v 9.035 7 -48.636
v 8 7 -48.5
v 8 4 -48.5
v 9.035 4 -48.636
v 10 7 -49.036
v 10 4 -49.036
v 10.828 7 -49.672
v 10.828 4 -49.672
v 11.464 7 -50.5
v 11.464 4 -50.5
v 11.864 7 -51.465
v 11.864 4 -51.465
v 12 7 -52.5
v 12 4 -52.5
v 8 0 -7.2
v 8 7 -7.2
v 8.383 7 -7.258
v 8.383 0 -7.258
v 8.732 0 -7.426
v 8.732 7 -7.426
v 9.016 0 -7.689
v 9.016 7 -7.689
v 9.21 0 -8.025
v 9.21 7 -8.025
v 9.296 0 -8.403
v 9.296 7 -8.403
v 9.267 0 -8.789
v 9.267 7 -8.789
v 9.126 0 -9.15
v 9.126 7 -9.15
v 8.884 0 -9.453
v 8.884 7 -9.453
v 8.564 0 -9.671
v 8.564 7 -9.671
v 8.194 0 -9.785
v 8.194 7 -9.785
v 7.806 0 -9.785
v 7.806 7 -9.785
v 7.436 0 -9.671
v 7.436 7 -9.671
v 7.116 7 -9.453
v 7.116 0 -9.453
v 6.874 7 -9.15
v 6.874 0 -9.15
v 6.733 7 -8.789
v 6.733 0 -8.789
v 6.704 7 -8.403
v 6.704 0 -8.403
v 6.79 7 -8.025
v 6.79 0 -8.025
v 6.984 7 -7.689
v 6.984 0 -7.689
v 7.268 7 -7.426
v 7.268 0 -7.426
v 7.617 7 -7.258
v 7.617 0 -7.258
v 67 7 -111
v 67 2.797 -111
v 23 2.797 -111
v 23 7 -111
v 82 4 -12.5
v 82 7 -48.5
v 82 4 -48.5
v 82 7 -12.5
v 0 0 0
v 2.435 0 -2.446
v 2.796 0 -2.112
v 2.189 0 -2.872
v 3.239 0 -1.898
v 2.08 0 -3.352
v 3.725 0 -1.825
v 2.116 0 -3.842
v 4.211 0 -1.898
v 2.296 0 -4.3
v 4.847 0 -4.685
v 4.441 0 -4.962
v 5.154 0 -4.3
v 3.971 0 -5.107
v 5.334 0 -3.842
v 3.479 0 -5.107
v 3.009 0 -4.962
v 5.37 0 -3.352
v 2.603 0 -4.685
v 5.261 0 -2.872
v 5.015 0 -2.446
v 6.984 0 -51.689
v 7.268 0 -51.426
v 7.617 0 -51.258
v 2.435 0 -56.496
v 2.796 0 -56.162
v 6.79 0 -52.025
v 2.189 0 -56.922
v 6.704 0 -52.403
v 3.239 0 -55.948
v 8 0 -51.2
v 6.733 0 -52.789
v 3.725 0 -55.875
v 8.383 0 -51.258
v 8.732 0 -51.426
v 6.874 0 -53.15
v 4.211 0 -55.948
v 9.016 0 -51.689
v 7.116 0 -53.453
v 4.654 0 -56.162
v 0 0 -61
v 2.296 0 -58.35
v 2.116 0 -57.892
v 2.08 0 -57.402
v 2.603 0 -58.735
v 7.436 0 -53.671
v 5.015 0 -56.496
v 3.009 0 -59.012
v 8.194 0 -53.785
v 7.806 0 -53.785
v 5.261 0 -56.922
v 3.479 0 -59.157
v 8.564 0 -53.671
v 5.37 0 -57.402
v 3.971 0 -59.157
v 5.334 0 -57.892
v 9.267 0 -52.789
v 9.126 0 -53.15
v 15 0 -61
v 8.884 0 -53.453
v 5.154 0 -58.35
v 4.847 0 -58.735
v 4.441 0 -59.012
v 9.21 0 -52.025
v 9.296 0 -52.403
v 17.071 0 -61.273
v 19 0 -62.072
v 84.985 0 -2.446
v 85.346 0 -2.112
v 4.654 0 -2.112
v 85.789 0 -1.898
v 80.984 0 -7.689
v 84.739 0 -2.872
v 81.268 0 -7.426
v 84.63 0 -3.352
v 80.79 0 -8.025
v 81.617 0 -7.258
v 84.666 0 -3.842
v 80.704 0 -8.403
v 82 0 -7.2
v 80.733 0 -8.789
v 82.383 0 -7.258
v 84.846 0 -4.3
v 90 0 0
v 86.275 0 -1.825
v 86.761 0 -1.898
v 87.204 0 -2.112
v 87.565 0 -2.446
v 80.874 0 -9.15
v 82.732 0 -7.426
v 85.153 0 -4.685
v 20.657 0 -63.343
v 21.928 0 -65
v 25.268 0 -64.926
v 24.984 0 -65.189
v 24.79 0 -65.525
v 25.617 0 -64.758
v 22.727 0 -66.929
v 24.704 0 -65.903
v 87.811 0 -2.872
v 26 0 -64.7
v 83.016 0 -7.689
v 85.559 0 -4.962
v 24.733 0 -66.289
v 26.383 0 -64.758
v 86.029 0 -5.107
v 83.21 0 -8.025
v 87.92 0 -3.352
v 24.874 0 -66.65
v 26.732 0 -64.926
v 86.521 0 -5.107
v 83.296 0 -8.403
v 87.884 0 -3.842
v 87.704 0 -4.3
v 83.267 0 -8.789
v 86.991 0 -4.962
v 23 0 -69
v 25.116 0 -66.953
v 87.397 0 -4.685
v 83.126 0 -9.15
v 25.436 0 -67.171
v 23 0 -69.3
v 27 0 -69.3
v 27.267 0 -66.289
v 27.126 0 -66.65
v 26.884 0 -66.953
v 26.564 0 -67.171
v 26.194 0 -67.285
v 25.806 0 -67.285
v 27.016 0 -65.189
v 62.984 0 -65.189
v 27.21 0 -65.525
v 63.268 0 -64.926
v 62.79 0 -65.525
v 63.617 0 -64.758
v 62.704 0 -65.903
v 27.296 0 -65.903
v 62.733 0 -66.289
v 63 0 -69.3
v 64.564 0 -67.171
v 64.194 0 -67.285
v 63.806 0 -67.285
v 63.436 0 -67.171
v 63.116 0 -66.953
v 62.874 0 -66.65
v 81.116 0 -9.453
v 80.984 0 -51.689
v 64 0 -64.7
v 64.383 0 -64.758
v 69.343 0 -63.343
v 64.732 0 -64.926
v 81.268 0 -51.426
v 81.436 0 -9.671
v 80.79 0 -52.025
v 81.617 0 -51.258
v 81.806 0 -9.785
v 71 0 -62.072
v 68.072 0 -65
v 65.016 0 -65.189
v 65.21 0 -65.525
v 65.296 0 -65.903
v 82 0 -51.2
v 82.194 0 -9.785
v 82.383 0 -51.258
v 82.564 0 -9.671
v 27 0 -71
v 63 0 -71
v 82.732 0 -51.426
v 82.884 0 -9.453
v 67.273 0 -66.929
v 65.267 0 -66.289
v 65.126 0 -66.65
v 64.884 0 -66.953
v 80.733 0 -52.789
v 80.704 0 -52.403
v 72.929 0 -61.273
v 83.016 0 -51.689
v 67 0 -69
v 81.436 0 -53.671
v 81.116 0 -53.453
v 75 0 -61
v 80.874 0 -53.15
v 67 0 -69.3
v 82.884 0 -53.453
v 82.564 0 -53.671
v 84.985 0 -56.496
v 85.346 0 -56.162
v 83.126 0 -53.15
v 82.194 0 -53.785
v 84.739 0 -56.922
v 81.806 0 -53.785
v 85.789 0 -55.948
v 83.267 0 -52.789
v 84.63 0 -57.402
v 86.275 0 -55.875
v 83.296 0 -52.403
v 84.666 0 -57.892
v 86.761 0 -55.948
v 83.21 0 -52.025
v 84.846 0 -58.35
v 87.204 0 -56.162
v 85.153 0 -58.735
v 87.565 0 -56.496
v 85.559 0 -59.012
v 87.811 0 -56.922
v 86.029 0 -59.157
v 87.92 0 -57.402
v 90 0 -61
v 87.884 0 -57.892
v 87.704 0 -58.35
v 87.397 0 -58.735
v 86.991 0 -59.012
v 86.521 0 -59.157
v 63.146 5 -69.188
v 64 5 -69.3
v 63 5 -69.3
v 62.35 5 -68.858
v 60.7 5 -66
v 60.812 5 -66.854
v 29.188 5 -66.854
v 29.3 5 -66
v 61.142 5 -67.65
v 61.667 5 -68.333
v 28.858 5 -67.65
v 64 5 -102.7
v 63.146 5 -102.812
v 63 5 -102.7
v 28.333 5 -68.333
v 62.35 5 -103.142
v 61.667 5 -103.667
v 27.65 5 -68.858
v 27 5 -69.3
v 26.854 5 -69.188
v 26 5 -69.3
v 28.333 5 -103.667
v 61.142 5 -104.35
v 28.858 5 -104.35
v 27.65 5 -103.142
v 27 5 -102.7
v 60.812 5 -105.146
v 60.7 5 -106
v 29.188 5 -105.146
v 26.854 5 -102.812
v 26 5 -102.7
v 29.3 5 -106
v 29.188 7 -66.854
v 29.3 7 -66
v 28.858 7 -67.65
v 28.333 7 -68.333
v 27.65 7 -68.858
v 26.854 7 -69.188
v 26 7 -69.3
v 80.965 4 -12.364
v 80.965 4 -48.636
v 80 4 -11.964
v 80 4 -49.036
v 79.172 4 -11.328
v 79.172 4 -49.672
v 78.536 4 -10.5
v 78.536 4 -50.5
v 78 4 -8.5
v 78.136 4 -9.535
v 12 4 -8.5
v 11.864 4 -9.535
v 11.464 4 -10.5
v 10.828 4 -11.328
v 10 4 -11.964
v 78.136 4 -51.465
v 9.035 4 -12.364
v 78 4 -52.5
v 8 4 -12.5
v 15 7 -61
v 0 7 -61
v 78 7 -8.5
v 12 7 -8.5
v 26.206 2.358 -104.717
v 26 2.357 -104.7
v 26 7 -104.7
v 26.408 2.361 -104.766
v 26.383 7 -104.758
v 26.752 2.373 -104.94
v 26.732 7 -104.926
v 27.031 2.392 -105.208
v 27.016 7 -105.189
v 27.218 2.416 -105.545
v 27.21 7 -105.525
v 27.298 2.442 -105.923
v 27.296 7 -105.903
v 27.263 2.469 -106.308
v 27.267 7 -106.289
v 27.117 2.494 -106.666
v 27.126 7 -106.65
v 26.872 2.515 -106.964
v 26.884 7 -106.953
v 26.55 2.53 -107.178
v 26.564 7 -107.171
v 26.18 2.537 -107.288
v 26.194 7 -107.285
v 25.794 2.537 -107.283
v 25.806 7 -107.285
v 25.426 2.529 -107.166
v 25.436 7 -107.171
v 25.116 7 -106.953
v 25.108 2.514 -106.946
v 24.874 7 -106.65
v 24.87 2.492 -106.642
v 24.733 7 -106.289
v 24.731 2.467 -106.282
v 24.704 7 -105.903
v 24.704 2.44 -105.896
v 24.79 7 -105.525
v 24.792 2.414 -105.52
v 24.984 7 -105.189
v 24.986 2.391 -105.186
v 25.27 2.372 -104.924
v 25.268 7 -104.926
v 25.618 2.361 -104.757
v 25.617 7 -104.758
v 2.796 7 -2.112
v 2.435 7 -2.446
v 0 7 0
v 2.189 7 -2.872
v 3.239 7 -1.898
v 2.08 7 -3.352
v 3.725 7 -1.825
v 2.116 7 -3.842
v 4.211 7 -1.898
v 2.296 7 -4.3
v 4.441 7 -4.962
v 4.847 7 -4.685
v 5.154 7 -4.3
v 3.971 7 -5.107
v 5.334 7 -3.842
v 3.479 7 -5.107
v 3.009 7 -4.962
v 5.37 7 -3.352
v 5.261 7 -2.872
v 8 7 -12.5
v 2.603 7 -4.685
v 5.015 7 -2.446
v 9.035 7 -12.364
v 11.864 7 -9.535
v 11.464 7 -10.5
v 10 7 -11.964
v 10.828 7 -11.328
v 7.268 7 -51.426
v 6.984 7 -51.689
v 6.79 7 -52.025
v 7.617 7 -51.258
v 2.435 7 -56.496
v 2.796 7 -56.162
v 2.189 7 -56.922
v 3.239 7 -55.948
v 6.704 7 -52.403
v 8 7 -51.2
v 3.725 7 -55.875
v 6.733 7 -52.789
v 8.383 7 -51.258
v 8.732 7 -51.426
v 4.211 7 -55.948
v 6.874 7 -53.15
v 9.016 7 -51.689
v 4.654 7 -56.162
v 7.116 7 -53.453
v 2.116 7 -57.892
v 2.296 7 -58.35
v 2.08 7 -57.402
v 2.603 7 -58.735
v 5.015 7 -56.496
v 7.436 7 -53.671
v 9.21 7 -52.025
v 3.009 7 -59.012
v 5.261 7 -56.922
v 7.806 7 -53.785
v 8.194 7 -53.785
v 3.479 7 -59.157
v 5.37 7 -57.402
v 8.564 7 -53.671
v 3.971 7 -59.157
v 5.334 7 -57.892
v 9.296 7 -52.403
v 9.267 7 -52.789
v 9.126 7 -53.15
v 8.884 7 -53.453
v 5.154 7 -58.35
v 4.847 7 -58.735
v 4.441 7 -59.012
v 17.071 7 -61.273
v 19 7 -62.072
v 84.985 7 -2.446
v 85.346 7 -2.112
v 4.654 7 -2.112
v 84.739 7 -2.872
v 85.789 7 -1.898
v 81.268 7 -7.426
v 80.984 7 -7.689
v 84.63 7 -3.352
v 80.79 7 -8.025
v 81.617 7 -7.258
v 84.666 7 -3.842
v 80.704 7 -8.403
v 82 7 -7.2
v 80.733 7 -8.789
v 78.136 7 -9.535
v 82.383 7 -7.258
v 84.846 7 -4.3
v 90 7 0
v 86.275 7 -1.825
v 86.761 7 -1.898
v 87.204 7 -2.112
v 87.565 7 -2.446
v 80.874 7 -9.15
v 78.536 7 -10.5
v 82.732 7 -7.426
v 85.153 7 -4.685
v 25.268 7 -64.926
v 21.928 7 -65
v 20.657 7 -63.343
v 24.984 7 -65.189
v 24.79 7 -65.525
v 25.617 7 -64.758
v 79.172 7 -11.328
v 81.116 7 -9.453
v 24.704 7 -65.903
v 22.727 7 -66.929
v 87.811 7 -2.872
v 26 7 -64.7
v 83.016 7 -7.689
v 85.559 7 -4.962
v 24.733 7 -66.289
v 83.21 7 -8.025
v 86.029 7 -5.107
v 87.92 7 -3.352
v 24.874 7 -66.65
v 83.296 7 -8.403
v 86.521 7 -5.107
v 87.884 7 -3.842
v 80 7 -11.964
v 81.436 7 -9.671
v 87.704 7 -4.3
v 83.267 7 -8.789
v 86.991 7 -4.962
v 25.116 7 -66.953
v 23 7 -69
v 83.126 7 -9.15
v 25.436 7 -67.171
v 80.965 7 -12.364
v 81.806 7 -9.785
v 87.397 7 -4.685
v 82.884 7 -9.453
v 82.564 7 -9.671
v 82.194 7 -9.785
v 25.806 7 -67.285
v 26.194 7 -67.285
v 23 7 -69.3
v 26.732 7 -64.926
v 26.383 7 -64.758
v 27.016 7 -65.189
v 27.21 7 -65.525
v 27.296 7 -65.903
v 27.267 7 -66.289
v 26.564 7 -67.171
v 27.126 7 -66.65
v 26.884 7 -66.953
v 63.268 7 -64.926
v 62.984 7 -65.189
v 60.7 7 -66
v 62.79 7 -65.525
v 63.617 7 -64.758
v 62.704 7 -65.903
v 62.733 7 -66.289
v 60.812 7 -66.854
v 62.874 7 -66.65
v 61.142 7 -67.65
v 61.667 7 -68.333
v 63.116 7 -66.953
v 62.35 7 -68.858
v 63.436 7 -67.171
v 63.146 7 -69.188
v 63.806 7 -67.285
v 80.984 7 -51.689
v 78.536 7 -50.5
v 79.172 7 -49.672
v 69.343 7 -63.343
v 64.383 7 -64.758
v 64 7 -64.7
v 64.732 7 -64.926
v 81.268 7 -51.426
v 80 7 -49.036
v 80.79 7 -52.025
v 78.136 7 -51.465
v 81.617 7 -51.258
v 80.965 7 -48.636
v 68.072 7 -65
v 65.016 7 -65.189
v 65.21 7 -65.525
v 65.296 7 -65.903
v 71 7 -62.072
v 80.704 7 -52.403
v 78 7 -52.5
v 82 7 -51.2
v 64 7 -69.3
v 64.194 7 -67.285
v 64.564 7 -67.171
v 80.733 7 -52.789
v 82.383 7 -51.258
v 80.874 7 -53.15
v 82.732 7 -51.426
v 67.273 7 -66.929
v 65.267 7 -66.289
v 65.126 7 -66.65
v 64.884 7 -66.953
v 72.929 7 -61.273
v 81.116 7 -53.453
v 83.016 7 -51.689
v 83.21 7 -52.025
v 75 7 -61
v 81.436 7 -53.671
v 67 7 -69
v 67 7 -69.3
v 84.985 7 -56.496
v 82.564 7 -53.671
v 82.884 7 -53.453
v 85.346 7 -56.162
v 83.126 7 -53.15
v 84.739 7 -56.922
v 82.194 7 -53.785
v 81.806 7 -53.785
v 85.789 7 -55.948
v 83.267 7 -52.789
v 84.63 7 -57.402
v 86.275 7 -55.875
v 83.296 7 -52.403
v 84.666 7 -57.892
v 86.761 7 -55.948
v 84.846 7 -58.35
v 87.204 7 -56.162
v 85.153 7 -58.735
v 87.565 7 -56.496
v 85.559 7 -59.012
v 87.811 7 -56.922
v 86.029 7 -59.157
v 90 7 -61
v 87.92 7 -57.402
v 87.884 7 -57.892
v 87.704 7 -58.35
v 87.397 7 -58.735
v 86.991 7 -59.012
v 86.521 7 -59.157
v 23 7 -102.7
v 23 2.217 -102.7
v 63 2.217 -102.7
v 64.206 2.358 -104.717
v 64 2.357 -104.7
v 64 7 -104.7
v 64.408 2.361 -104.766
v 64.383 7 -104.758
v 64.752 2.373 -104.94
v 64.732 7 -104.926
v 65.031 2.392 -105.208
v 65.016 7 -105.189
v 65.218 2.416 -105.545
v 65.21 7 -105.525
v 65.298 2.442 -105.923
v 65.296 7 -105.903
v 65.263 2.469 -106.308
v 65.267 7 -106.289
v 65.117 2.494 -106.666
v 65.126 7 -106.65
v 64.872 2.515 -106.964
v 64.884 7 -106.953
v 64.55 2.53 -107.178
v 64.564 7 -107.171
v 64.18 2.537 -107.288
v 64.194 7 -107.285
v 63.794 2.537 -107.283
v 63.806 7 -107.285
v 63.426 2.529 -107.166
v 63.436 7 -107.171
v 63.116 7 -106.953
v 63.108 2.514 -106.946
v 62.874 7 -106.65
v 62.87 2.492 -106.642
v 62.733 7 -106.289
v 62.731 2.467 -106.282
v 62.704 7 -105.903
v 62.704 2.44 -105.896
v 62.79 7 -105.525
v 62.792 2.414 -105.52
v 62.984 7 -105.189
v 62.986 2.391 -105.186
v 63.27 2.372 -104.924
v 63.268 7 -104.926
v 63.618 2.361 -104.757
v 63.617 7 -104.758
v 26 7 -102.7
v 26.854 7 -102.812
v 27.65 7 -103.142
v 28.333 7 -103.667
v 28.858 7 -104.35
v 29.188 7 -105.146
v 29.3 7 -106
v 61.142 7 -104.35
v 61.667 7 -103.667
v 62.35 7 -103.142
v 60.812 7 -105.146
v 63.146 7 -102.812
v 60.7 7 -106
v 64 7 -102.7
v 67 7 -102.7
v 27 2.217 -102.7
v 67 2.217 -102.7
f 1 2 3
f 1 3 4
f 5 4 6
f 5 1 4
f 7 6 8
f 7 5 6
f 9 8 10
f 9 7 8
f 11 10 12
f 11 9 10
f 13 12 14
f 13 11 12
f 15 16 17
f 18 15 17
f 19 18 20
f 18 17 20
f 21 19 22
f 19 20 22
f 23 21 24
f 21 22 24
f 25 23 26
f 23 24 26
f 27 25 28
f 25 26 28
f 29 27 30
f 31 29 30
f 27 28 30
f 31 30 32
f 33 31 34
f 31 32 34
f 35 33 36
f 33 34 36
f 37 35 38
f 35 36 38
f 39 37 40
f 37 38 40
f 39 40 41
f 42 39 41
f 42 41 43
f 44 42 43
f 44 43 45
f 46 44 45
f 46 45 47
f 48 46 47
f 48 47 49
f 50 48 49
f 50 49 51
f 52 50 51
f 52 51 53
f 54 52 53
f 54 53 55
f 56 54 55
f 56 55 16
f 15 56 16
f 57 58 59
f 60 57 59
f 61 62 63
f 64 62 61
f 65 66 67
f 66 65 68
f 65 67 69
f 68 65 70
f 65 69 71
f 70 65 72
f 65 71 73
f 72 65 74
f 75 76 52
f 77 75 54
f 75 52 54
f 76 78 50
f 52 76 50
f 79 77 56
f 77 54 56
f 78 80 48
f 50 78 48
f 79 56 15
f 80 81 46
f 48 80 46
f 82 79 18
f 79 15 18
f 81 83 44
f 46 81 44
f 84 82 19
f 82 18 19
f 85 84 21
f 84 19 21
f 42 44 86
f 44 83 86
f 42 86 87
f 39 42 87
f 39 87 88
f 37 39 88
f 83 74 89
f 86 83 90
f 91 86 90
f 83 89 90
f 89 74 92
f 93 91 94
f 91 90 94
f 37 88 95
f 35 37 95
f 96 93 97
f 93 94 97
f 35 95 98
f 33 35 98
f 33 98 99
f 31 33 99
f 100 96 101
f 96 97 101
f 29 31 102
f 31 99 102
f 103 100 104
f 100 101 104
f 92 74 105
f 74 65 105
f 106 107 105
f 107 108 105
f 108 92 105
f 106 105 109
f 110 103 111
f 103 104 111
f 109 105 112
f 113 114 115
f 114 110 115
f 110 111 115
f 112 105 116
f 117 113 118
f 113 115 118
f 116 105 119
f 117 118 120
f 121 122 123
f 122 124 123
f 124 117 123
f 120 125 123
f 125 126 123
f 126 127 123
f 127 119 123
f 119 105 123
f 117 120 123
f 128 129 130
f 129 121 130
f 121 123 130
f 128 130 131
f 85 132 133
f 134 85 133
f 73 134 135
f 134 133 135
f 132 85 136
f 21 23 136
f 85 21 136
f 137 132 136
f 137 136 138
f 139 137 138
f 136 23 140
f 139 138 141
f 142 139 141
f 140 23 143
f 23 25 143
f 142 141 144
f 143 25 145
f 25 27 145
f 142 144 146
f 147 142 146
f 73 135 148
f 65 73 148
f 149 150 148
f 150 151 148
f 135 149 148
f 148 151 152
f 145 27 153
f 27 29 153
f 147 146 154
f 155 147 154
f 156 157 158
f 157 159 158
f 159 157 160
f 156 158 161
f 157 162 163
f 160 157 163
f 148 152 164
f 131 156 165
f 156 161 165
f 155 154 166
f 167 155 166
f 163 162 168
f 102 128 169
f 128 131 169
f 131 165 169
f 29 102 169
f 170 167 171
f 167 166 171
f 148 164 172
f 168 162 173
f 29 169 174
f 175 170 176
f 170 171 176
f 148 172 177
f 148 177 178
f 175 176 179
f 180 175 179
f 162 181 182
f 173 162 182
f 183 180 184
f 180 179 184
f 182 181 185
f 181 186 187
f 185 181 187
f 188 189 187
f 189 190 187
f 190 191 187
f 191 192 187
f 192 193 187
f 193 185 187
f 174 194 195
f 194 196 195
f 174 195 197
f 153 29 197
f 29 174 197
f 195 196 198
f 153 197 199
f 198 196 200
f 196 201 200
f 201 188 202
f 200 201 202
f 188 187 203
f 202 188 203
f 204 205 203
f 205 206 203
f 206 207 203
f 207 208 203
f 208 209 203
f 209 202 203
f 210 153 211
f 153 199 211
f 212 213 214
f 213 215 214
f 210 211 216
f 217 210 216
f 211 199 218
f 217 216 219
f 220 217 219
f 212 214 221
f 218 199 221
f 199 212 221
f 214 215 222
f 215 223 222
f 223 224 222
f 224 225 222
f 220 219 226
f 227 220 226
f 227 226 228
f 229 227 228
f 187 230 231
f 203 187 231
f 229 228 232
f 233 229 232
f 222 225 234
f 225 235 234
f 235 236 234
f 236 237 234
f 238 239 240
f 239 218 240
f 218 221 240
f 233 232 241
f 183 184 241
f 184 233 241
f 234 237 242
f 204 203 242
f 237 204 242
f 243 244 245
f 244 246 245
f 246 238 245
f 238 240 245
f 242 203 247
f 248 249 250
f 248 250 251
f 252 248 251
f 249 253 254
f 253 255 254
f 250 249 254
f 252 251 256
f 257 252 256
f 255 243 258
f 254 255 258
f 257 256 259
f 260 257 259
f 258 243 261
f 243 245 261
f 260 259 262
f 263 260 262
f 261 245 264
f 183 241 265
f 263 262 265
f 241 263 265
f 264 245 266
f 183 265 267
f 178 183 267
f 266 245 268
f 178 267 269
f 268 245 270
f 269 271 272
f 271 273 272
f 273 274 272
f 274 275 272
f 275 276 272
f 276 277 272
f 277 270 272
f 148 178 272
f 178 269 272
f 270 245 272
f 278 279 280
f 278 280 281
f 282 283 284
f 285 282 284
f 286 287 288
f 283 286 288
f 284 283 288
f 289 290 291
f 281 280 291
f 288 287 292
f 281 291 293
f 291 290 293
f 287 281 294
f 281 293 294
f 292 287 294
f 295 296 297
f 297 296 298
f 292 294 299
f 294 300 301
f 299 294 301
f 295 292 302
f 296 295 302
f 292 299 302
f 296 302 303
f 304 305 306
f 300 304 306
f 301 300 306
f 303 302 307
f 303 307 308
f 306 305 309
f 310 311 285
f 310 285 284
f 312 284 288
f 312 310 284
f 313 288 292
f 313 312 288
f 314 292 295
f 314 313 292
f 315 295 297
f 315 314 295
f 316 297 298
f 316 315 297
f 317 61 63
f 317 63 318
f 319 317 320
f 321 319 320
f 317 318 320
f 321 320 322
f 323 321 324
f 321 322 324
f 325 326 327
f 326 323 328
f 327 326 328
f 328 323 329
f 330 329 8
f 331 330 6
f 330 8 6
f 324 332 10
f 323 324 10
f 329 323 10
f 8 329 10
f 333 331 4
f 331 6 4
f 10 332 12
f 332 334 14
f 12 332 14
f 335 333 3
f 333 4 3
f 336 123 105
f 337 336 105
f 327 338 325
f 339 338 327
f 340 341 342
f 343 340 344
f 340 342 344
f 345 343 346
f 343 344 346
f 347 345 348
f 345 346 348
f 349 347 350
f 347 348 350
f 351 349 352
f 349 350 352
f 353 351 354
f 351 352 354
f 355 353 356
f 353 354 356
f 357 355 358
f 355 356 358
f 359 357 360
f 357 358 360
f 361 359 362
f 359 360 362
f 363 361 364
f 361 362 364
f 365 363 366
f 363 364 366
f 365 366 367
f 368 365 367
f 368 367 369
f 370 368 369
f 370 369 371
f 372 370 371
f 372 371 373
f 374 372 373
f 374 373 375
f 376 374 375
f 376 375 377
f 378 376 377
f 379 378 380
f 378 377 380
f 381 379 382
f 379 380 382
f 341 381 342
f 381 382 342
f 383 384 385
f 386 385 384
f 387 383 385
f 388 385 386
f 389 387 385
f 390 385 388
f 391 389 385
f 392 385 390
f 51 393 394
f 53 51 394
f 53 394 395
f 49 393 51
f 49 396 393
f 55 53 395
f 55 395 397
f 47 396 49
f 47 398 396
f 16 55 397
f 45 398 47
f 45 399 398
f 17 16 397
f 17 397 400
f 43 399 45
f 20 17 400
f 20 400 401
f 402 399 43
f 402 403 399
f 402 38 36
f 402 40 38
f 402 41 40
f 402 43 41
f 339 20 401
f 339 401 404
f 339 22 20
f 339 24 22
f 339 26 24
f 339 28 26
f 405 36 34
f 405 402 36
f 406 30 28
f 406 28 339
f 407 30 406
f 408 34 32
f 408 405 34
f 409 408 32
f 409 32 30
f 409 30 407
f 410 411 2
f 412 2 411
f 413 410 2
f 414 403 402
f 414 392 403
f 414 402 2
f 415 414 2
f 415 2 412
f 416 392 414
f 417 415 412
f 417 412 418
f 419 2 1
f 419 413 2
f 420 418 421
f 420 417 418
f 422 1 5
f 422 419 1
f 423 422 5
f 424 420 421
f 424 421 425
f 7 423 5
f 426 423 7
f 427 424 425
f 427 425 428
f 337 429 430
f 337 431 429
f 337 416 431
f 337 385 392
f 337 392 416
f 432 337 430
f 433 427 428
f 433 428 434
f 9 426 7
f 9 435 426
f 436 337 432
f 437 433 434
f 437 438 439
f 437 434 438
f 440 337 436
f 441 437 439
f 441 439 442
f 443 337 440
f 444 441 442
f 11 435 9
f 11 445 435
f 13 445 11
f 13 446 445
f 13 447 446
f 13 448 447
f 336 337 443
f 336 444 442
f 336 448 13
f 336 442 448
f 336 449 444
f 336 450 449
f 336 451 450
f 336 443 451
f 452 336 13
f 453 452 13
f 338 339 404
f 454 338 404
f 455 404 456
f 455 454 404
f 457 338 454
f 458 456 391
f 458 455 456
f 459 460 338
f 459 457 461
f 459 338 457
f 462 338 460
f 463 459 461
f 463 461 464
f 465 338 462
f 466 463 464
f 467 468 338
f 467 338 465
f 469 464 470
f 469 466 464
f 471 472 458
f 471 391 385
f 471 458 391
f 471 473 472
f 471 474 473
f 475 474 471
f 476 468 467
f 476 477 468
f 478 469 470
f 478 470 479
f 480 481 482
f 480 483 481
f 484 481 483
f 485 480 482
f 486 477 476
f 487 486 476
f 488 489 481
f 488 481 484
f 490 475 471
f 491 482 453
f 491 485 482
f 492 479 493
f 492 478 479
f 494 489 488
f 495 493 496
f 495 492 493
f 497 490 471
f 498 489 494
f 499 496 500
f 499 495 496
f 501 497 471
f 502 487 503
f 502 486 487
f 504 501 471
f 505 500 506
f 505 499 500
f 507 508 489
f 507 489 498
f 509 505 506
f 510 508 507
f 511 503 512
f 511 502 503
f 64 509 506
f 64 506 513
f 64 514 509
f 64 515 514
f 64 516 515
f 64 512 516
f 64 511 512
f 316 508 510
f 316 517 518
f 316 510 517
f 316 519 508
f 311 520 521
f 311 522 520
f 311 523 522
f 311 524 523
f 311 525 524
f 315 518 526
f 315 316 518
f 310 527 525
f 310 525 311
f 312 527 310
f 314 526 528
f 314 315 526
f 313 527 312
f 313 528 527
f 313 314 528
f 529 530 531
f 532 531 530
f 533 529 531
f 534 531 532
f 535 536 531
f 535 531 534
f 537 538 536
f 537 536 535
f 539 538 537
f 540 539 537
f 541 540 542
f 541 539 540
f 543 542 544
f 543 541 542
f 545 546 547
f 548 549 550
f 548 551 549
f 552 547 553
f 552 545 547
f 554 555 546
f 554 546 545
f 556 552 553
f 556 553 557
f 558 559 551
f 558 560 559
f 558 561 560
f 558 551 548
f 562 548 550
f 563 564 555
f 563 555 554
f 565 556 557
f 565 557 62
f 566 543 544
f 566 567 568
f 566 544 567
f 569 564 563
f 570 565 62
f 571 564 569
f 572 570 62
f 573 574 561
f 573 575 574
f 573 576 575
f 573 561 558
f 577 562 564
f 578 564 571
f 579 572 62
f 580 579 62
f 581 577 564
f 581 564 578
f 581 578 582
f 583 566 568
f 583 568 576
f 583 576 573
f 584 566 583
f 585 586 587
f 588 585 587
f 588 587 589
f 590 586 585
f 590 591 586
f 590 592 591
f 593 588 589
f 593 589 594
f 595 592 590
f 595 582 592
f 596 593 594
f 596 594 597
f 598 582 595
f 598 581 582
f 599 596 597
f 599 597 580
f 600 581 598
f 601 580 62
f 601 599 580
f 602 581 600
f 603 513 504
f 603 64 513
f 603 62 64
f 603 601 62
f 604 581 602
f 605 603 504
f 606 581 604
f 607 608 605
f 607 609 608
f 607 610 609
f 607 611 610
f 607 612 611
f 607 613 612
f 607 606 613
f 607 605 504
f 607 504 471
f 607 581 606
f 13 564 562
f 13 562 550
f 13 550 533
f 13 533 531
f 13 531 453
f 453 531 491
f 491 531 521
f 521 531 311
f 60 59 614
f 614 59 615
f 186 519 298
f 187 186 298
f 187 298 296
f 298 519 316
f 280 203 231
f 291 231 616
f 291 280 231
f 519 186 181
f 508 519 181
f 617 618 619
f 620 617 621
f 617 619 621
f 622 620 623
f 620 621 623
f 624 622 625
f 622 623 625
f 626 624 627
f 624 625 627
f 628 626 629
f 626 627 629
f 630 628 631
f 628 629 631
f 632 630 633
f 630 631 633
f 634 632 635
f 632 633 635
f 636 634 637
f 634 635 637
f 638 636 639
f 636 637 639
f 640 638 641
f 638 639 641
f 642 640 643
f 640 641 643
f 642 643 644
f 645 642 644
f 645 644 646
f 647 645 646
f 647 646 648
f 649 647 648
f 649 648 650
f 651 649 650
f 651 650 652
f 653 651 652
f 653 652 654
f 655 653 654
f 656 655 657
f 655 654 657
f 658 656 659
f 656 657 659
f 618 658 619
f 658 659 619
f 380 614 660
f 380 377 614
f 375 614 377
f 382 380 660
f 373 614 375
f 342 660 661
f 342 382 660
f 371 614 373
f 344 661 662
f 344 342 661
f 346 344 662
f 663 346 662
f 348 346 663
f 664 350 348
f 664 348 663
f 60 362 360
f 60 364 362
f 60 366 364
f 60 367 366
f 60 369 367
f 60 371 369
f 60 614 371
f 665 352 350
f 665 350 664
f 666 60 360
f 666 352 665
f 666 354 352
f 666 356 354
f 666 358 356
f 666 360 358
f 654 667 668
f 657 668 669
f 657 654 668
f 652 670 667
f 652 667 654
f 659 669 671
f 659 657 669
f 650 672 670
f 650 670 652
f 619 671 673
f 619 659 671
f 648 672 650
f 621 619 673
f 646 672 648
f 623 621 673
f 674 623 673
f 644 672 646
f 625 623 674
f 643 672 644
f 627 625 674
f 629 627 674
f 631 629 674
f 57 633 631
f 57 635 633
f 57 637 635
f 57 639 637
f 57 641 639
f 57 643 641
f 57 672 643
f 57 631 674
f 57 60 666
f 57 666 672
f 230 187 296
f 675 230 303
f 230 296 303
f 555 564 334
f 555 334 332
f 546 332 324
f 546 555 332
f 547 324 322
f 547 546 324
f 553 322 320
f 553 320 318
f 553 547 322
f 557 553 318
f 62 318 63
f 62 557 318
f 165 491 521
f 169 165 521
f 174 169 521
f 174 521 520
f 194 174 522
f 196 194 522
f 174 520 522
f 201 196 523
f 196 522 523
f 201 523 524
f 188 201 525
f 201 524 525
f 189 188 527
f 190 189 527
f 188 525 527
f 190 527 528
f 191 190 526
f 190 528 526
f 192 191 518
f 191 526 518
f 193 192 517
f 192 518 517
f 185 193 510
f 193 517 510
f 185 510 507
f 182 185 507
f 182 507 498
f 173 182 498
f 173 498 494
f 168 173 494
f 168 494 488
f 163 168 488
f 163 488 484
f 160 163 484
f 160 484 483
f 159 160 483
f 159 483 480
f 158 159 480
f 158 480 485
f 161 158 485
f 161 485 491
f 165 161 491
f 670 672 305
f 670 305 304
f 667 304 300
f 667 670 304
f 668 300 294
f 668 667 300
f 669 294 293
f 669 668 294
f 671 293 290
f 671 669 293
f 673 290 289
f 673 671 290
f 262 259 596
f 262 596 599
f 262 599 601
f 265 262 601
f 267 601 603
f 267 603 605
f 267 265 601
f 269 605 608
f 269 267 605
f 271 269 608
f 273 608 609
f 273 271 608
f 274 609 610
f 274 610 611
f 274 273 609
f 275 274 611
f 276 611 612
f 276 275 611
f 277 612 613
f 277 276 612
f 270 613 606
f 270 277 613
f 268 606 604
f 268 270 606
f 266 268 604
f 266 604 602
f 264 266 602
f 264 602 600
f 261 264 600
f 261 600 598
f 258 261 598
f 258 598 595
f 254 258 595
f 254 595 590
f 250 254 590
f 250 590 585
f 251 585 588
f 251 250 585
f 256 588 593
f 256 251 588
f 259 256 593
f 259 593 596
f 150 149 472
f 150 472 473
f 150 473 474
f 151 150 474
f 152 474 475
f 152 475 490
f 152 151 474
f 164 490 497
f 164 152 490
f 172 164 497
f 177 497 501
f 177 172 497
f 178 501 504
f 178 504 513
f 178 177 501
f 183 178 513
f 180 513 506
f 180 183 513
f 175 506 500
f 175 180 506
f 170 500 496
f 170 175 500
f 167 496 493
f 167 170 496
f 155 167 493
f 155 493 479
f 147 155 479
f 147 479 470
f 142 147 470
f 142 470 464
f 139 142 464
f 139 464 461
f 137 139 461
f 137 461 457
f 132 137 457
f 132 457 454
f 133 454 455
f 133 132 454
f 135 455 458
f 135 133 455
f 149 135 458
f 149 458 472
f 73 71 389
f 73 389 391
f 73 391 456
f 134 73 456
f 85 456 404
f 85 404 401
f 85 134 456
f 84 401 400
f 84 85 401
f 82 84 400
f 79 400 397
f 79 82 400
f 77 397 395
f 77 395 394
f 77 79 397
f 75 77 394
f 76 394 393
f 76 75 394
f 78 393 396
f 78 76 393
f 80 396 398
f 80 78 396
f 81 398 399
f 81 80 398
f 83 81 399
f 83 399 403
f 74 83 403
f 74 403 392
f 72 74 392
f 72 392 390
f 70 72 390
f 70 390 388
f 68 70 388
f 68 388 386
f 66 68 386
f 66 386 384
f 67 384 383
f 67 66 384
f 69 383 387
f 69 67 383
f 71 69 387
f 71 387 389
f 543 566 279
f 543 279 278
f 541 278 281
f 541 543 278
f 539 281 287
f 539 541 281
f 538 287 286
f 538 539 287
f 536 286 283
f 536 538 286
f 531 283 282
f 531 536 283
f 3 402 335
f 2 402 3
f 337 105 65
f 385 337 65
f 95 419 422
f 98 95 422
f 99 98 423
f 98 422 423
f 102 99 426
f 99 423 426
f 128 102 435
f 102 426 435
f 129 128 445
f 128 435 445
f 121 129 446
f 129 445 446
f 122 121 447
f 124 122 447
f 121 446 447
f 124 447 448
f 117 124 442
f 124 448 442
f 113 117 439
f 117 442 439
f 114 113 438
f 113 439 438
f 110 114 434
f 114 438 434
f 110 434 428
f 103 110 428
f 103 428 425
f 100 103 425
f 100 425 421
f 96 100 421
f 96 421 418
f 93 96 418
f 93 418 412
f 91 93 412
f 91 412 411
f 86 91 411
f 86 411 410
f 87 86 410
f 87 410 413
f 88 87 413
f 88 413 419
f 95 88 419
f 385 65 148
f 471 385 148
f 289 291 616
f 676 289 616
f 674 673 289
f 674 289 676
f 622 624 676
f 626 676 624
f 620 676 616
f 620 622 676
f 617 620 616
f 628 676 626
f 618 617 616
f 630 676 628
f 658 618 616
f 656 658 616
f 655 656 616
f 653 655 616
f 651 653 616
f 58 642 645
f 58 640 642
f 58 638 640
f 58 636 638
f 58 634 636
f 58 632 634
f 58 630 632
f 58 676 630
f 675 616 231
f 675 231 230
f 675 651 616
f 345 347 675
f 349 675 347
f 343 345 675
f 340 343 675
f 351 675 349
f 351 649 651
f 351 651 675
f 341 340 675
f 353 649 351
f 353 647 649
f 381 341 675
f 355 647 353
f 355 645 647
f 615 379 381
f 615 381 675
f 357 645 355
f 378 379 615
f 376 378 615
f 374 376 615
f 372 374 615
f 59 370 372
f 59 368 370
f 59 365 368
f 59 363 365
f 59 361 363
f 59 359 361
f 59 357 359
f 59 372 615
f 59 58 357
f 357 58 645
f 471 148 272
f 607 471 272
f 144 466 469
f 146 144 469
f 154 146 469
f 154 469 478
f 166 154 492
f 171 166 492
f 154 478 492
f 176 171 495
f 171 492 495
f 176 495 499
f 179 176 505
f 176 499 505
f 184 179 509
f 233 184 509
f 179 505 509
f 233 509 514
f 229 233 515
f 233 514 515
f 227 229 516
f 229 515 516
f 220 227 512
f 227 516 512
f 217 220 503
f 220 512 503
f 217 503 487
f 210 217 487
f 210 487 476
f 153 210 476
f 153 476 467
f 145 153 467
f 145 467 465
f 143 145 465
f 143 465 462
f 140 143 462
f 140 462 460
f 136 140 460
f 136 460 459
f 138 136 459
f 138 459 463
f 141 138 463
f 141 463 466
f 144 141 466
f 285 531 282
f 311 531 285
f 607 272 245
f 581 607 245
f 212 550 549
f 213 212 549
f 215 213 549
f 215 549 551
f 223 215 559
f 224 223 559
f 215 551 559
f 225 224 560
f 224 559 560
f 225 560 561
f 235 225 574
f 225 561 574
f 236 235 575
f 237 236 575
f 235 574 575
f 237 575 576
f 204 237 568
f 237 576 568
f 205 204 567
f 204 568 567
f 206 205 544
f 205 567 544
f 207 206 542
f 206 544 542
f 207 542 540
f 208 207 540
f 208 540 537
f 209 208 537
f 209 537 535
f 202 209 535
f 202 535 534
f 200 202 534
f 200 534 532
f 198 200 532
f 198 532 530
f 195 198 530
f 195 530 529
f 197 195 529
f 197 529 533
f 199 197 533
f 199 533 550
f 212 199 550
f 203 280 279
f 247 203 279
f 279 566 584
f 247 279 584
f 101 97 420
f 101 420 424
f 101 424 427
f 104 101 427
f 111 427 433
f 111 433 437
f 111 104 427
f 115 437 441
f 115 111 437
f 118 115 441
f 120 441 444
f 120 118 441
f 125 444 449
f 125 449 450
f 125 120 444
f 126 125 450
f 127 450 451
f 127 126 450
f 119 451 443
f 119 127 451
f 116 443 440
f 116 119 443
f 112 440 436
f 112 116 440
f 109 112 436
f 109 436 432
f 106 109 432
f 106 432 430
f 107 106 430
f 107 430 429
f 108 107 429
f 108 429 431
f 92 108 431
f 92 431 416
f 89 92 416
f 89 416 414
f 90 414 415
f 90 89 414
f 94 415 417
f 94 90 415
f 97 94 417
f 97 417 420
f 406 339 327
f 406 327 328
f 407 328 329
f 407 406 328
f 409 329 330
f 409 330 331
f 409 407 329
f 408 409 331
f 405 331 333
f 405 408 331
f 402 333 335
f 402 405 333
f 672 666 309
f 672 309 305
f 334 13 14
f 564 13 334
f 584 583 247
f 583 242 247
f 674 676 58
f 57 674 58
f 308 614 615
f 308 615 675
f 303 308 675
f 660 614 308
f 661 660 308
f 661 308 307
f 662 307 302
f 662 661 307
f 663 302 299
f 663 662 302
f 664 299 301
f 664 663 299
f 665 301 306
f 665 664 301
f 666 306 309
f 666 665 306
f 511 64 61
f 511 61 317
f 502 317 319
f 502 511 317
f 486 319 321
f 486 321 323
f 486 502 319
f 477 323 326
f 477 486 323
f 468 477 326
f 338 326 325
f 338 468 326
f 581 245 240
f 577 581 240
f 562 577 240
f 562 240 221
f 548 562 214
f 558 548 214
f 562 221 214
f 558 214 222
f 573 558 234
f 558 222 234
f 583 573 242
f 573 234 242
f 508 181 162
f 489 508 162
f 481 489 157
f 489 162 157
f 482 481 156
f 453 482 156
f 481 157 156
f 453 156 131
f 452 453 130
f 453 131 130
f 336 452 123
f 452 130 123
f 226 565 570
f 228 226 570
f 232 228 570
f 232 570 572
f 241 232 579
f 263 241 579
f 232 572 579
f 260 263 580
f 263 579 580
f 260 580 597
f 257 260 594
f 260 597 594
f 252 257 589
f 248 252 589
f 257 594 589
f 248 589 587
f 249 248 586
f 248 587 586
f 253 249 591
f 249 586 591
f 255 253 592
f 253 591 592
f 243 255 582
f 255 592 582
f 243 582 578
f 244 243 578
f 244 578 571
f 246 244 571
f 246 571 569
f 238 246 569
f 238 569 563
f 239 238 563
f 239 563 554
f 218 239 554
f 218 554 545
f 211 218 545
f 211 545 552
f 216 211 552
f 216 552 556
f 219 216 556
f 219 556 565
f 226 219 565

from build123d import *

# Parameters (mm, degrees)
SKETCH1_R           = 1.65
BOSS_EXTRUDE1_DEPTH = 7
CHAMFER1_SIZE       = 40
CHAMFER1_SIZE2      = 2.797072478
SKETCH2_R           = 1.3
CUT_EXTRUDE1_DEPTH  = 144.073407732
SKETCH3_R           = 1.3
CUT_EXTRUDE2_DEPTH  = 144.073407732
CUT_EXTRUDE3_DEPTH  = 3
CUT_EXTRUDE4_DEPTH  = 2
SKETCH6_W           = 4
SKETCH6_H           = 33.4
CUT_EXTRUDE5_DEPTH  = 144.073407732


with BuildPart() as part:
    # Sketch1 → Boss-Extrude1 (new body)
    with BuildSketch(Plane(origin=(0, 0, 0), x_dir=(1, 0, 0), z_dir=(0, 1, 0))):
        with BuildLine():
            Line((0, 0), (90, 0))
            Line((90, 0), (90, 61))
            Line((90, 61), (75, 61))
            ThreePointArc((75, 61), (69.343145751, 63.343145751), (67, 69))
            Line((67, 69), (67, 111))
            Line((67, 111), (23, 111))
            Line((23, 111), (23, 69))
            ThreePointArc((23, 69), (20.656854249, 63.343145751), (15, 61))
            Line((15, 61), (0, 61))
            Line((0, 61), (0, 0))
        make_face()
        with Locations(Location((3.725, 57.525, 0), (0, 0, 270))):
            Circle(SKETCH1_R, mode=Mode.SUBTRACT)
        with Locations(Location((86.275, 57.525, 0), (0, 0, 270))):
            Circle(SKETCH1_R, mode=Mode.SUBTRACT)
        with Locations(Location((86.275, 3.475, 0), (0, 0, 270))):
            Circle(SKETCH1_R, mode=Mode.SUBTRACT)
        with Locations(Location((3.725, 3.475, 0), (0, 0, 270))):
            Circle(SKETCH1_R, mode=Mode.SUBTRACT)
    extrude(amount=BOSS_EXTRUDE1_DEPTH)

    # Chamfer1
    chamfer1_edges = [part.edges().sort_by_distance(p)[0] for p in [
        (45, 0, -111),
    ]]
    chamfer1_side = [part.faces().sort_by_distance(p)[0] for p in [
        (45, 0, -46.507129493),
    ]]
    chamfer(chamfer1_edges, length=CHAMFER1_SIZE, length2=CHAMFER1_SIZE2, reference=chamfer1_side[0])

    # Sketch2 → Cut-Extrude1 (cut, through all)
    with BuildSketch(Plane(origin=(0, 7, 0), x_dir=(1, 0, 0), z_dir=(0, 1, 0))):
        with Locations(Location((8, 52.5, 0), (0, 0, 270))):
            Circle(SKETCH2_R)
        with Locations(Location((8, 8.5, 0), (0, 0, 270))):
            Circle(SKETCH2_R)
        with Locations(Location((82, 52.5, 0), (0, 0, 270))):
            Circle(SKETCH2_R)
        with Locations(Location((82, 8.5, 0), (0, 0, 270))):
            Circle(SKETCH2_R)
    extrude(amount=-CUT_EXTRUDE1_DEPTH, mode=Mode.SUBTRACT)

    # Sketch3 → Cut-Extrude2 (cut, through all)
    with BuildSketch(Plane(origin=(0, 7, 0), x_dir=(1, 0, 0), z_dir=(0, 1, 0))):
        with Locations(Location((26, 106, 0), (0, 0, 270))):
            Circle(SKETCH3_R)
        with Locations(Location((64, 106, 0), (0, 0, 270))):
            Circle(SKETCH3_R)
        with Locations(Location((26, 66, 0), (0, 0, 270))):
            Circle(SKETCH3_R)
        with Locations(Location((64, 66, 0), (0, 0, 270))):
            Circle(SKETCH3_R)
    extrude(amount=-CUT_EXTRUDE2_DEPTH, mode=Mode.SUBTRACT)

    # Sketch4 → Cut-Extrude3 (cut)
    with BuildSketch(Plane(origin=(0, 7, 0), x_dir=(1, 0, 0), z_dir=(0, 1, 0))):
        with BuildLine():
            Line((12, 52.5), (78, 52.5))
            ThreePointArc((78, 52.5), (79.171572875, 49.671572875), (82, 48.5))
            Line((82, 48.5), (82, 12.5))
            ThreePointArc((82, 12.5), (79.171572875, 11.328427125), (78, 8.5))
            Line((78, 8.5), (12, 8.5))
            ThreePointArc((12, 8.5), (10.828427125, 11.328427125), (8, 12.5))
            Line((8, 12.5), (8, 48.5))
            ThreePointArc((8, 48.5), (10.828427125, 49.671572875), (12, 52.5))
        make_face()
    extrude(amount=-CUT_EXTRUDE3_DEPTH, mode=Mode.SUBTRACT)

    # Sketch5 → Cut-Extrude4 (cut)
    with BuildSketch(Plane(origin=(0, 7, 0), x_dir=(1, 0, 0), z_dir=(0, 1, 0))):
        with BuildLine():
            Line((29.3, 106), (60.7, 106))
            ThreePointArc((60.7, 106), (61.666547622, 103.666547622), (64, 102.7))
            Line((64, 102.7), (64, 69.3))
            ThreePointArc((64, 69.3), (61.666547622, 68.333452378), (60.7, 66))
            Line((60.7, 66), (29.3, 66))
            ThreePointArc((29.3, 66), (28.333452378, 68.333452378), (26, 69.3))
            Line((26, 69.3), (26, 102.7))
            ThreePointArc((26, 102.7), (28.333452378, 103.666547622), (29.3, 106))
        make_face()
    extrude(amount=-CUT_EXTRUDE4_DEPTH, mode=Mode.SUBTRACT)

    # Sketch6 → Cut-Extrude5 (cut, through all)
    with BuildSketch(Plane(origin=(0, 7, 0), x_dir=(1, 0, 0), z_dir=(0, 1, 0))):
        with Locations((25, 86)):
            Rectangle(SKETCH6_W, SKETCH6_H)
        with Locations((65, 86)):
            Rectangle(SKETCH6_W, SKETCH6_H)
    extrude(amount=-CUT_EXTRUDE5_DEPTH, mode=Mode.SUBTRACT)


solid = part.part
